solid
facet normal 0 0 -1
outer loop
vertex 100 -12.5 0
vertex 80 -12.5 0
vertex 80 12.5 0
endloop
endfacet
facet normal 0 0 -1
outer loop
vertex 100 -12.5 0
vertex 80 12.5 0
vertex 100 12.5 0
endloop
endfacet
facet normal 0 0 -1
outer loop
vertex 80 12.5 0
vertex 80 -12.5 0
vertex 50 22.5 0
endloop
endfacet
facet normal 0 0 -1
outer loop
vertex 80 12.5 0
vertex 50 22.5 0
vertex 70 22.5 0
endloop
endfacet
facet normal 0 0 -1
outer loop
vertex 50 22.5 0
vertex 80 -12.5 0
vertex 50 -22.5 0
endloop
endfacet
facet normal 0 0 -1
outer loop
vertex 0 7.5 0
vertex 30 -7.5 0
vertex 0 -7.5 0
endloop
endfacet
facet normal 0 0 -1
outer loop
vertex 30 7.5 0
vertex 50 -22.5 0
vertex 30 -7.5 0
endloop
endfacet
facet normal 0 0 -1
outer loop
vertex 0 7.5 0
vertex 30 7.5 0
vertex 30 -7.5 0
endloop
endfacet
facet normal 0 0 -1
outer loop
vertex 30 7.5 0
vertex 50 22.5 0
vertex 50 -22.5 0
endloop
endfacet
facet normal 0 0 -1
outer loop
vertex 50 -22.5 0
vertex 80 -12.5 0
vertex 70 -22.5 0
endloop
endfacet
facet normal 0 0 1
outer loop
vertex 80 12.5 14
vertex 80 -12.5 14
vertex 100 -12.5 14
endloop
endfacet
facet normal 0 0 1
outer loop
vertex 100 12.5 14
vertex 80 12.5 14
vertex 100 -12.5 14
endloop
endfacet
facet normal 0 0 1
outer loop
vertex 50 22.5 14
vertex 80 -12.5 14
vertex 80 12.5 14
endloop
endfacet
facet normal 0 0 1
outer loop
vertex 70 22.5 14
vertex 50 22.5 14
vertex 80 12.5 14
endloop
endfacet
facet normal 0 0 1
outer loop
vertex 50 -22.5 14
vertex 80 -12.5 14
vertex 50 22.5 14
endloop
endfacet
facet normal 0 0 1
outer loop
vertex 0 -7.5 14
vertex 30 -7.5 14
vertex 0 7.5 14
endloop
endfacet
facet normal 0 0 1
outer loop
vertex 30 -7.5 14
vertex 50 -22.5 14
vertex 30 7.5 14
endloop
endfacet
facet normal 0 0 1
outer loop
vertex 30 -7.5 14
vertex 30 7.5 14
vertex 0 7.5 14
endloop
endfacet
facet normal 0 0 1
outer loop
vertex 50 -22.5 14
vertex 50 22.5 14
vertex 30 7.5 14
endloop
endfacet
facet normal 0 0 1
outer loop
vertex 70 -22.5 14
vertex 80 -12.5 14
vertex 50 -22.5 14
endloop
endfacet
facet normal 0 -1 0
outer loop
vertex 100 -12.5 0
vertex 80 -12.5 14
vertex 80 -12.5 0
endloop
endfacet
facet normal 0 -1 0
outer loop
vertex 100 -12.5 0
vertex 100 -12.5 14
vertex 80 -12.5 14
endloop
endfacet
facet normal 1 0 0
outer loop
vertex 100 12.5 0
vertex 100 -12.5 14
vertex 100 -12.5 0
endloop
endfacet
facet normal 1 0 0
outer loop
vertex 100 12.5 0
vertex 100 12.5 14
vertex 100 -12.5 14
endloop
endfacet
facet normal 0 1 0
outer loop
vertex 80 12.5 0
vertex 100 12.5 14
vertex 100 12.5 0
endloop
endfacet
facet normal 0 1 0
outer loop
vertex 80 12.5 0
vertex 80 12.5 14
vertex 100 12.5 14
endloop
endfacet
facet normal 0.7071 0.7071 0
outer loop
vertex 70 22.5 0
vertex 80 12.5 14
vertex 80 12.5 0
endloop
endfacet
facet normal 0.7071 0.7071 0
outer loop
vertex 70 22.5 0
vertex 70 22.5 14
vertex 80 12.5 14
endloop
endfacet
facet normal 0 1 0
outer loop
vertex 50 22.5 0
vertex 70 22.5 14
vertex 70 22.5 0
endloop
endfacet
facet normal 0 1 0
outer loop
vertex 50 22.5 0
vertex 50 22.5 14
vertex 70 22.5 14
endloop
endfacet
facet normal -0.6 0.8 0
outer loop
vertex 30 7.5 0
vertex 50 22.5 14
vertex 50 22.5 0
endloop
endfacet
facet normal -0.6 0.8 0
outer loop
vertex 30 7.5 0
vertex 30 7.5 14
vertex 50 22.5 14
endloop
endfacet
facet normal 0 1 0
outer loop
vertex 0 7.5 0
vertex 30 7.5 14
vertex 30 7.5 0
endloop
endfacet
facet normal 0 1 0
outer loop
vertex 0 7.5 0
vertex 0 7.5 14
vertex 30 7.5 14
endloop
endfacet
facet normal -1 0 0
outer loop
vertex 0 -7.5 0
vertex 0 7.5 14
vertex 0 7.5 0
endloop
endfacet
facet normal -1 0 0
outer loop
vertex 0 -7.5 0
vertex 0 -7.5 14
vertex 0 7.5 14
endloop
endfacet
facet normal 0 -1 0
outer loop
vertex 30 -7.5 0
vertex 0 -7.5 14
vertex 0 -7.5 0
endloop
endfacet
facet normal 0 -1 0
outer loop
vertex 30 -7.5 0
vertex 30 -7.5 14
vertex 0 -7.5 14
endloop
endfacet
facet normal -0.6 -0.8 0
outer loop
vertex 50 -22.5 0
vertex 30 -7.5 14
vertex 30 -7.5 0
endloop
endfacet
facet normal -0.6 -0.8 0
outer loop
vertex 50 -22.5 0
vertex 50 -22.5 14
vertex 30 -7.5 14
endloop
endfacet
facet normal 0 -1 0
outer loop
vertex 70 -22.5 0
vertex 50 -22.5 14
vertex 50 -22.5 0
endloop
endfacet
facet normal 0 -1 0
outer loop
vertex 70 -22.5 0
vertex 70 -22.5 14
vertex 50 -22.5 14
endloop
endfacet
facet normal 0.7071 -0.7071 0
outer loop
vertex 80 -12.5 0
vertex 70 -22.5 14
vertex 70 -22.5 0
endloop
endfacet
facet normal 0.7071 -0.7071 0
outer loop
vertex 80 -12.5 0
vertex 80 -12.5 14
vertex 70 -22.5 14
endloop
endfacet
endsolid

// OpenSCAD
// model parameters
d1=30;
d2=20;
d3=20;
d4=10;
d5=20;

w1=15;
w2=45;
w3=25;

h=14;

// distances to lengths
l1 = d1;
l2 = d1 + d2;
l3 = d1 + d2 + d3;
l4 = d1 + d2 + d3 + d4;
l5 = d1 + d2 + d3 + d4 + d5;

// right side points
p0 = [0, w1/2];
p1 = [l1, w1/2];
p2 = [l2, w2/2];
p3 = [l3, w2/2];
p4 = [l4, w3/2];
p5 = [l5, w3/2];

// left side points
p6 = [l5, -w3/2];
p7 = [l4, -w3/2];
p8 = [l3, -w2/2];
p9 = [l2, -w2/2];
p10 = [l1, -w1/2];
p11 = [0, -w1/2];

// all points
points = [p0, p1, p2, p3, p4, p5, p6, p7, p8, p9, p10, p11];

// extruded body profile
linear_extrude(height=h)
    polygon(points);
